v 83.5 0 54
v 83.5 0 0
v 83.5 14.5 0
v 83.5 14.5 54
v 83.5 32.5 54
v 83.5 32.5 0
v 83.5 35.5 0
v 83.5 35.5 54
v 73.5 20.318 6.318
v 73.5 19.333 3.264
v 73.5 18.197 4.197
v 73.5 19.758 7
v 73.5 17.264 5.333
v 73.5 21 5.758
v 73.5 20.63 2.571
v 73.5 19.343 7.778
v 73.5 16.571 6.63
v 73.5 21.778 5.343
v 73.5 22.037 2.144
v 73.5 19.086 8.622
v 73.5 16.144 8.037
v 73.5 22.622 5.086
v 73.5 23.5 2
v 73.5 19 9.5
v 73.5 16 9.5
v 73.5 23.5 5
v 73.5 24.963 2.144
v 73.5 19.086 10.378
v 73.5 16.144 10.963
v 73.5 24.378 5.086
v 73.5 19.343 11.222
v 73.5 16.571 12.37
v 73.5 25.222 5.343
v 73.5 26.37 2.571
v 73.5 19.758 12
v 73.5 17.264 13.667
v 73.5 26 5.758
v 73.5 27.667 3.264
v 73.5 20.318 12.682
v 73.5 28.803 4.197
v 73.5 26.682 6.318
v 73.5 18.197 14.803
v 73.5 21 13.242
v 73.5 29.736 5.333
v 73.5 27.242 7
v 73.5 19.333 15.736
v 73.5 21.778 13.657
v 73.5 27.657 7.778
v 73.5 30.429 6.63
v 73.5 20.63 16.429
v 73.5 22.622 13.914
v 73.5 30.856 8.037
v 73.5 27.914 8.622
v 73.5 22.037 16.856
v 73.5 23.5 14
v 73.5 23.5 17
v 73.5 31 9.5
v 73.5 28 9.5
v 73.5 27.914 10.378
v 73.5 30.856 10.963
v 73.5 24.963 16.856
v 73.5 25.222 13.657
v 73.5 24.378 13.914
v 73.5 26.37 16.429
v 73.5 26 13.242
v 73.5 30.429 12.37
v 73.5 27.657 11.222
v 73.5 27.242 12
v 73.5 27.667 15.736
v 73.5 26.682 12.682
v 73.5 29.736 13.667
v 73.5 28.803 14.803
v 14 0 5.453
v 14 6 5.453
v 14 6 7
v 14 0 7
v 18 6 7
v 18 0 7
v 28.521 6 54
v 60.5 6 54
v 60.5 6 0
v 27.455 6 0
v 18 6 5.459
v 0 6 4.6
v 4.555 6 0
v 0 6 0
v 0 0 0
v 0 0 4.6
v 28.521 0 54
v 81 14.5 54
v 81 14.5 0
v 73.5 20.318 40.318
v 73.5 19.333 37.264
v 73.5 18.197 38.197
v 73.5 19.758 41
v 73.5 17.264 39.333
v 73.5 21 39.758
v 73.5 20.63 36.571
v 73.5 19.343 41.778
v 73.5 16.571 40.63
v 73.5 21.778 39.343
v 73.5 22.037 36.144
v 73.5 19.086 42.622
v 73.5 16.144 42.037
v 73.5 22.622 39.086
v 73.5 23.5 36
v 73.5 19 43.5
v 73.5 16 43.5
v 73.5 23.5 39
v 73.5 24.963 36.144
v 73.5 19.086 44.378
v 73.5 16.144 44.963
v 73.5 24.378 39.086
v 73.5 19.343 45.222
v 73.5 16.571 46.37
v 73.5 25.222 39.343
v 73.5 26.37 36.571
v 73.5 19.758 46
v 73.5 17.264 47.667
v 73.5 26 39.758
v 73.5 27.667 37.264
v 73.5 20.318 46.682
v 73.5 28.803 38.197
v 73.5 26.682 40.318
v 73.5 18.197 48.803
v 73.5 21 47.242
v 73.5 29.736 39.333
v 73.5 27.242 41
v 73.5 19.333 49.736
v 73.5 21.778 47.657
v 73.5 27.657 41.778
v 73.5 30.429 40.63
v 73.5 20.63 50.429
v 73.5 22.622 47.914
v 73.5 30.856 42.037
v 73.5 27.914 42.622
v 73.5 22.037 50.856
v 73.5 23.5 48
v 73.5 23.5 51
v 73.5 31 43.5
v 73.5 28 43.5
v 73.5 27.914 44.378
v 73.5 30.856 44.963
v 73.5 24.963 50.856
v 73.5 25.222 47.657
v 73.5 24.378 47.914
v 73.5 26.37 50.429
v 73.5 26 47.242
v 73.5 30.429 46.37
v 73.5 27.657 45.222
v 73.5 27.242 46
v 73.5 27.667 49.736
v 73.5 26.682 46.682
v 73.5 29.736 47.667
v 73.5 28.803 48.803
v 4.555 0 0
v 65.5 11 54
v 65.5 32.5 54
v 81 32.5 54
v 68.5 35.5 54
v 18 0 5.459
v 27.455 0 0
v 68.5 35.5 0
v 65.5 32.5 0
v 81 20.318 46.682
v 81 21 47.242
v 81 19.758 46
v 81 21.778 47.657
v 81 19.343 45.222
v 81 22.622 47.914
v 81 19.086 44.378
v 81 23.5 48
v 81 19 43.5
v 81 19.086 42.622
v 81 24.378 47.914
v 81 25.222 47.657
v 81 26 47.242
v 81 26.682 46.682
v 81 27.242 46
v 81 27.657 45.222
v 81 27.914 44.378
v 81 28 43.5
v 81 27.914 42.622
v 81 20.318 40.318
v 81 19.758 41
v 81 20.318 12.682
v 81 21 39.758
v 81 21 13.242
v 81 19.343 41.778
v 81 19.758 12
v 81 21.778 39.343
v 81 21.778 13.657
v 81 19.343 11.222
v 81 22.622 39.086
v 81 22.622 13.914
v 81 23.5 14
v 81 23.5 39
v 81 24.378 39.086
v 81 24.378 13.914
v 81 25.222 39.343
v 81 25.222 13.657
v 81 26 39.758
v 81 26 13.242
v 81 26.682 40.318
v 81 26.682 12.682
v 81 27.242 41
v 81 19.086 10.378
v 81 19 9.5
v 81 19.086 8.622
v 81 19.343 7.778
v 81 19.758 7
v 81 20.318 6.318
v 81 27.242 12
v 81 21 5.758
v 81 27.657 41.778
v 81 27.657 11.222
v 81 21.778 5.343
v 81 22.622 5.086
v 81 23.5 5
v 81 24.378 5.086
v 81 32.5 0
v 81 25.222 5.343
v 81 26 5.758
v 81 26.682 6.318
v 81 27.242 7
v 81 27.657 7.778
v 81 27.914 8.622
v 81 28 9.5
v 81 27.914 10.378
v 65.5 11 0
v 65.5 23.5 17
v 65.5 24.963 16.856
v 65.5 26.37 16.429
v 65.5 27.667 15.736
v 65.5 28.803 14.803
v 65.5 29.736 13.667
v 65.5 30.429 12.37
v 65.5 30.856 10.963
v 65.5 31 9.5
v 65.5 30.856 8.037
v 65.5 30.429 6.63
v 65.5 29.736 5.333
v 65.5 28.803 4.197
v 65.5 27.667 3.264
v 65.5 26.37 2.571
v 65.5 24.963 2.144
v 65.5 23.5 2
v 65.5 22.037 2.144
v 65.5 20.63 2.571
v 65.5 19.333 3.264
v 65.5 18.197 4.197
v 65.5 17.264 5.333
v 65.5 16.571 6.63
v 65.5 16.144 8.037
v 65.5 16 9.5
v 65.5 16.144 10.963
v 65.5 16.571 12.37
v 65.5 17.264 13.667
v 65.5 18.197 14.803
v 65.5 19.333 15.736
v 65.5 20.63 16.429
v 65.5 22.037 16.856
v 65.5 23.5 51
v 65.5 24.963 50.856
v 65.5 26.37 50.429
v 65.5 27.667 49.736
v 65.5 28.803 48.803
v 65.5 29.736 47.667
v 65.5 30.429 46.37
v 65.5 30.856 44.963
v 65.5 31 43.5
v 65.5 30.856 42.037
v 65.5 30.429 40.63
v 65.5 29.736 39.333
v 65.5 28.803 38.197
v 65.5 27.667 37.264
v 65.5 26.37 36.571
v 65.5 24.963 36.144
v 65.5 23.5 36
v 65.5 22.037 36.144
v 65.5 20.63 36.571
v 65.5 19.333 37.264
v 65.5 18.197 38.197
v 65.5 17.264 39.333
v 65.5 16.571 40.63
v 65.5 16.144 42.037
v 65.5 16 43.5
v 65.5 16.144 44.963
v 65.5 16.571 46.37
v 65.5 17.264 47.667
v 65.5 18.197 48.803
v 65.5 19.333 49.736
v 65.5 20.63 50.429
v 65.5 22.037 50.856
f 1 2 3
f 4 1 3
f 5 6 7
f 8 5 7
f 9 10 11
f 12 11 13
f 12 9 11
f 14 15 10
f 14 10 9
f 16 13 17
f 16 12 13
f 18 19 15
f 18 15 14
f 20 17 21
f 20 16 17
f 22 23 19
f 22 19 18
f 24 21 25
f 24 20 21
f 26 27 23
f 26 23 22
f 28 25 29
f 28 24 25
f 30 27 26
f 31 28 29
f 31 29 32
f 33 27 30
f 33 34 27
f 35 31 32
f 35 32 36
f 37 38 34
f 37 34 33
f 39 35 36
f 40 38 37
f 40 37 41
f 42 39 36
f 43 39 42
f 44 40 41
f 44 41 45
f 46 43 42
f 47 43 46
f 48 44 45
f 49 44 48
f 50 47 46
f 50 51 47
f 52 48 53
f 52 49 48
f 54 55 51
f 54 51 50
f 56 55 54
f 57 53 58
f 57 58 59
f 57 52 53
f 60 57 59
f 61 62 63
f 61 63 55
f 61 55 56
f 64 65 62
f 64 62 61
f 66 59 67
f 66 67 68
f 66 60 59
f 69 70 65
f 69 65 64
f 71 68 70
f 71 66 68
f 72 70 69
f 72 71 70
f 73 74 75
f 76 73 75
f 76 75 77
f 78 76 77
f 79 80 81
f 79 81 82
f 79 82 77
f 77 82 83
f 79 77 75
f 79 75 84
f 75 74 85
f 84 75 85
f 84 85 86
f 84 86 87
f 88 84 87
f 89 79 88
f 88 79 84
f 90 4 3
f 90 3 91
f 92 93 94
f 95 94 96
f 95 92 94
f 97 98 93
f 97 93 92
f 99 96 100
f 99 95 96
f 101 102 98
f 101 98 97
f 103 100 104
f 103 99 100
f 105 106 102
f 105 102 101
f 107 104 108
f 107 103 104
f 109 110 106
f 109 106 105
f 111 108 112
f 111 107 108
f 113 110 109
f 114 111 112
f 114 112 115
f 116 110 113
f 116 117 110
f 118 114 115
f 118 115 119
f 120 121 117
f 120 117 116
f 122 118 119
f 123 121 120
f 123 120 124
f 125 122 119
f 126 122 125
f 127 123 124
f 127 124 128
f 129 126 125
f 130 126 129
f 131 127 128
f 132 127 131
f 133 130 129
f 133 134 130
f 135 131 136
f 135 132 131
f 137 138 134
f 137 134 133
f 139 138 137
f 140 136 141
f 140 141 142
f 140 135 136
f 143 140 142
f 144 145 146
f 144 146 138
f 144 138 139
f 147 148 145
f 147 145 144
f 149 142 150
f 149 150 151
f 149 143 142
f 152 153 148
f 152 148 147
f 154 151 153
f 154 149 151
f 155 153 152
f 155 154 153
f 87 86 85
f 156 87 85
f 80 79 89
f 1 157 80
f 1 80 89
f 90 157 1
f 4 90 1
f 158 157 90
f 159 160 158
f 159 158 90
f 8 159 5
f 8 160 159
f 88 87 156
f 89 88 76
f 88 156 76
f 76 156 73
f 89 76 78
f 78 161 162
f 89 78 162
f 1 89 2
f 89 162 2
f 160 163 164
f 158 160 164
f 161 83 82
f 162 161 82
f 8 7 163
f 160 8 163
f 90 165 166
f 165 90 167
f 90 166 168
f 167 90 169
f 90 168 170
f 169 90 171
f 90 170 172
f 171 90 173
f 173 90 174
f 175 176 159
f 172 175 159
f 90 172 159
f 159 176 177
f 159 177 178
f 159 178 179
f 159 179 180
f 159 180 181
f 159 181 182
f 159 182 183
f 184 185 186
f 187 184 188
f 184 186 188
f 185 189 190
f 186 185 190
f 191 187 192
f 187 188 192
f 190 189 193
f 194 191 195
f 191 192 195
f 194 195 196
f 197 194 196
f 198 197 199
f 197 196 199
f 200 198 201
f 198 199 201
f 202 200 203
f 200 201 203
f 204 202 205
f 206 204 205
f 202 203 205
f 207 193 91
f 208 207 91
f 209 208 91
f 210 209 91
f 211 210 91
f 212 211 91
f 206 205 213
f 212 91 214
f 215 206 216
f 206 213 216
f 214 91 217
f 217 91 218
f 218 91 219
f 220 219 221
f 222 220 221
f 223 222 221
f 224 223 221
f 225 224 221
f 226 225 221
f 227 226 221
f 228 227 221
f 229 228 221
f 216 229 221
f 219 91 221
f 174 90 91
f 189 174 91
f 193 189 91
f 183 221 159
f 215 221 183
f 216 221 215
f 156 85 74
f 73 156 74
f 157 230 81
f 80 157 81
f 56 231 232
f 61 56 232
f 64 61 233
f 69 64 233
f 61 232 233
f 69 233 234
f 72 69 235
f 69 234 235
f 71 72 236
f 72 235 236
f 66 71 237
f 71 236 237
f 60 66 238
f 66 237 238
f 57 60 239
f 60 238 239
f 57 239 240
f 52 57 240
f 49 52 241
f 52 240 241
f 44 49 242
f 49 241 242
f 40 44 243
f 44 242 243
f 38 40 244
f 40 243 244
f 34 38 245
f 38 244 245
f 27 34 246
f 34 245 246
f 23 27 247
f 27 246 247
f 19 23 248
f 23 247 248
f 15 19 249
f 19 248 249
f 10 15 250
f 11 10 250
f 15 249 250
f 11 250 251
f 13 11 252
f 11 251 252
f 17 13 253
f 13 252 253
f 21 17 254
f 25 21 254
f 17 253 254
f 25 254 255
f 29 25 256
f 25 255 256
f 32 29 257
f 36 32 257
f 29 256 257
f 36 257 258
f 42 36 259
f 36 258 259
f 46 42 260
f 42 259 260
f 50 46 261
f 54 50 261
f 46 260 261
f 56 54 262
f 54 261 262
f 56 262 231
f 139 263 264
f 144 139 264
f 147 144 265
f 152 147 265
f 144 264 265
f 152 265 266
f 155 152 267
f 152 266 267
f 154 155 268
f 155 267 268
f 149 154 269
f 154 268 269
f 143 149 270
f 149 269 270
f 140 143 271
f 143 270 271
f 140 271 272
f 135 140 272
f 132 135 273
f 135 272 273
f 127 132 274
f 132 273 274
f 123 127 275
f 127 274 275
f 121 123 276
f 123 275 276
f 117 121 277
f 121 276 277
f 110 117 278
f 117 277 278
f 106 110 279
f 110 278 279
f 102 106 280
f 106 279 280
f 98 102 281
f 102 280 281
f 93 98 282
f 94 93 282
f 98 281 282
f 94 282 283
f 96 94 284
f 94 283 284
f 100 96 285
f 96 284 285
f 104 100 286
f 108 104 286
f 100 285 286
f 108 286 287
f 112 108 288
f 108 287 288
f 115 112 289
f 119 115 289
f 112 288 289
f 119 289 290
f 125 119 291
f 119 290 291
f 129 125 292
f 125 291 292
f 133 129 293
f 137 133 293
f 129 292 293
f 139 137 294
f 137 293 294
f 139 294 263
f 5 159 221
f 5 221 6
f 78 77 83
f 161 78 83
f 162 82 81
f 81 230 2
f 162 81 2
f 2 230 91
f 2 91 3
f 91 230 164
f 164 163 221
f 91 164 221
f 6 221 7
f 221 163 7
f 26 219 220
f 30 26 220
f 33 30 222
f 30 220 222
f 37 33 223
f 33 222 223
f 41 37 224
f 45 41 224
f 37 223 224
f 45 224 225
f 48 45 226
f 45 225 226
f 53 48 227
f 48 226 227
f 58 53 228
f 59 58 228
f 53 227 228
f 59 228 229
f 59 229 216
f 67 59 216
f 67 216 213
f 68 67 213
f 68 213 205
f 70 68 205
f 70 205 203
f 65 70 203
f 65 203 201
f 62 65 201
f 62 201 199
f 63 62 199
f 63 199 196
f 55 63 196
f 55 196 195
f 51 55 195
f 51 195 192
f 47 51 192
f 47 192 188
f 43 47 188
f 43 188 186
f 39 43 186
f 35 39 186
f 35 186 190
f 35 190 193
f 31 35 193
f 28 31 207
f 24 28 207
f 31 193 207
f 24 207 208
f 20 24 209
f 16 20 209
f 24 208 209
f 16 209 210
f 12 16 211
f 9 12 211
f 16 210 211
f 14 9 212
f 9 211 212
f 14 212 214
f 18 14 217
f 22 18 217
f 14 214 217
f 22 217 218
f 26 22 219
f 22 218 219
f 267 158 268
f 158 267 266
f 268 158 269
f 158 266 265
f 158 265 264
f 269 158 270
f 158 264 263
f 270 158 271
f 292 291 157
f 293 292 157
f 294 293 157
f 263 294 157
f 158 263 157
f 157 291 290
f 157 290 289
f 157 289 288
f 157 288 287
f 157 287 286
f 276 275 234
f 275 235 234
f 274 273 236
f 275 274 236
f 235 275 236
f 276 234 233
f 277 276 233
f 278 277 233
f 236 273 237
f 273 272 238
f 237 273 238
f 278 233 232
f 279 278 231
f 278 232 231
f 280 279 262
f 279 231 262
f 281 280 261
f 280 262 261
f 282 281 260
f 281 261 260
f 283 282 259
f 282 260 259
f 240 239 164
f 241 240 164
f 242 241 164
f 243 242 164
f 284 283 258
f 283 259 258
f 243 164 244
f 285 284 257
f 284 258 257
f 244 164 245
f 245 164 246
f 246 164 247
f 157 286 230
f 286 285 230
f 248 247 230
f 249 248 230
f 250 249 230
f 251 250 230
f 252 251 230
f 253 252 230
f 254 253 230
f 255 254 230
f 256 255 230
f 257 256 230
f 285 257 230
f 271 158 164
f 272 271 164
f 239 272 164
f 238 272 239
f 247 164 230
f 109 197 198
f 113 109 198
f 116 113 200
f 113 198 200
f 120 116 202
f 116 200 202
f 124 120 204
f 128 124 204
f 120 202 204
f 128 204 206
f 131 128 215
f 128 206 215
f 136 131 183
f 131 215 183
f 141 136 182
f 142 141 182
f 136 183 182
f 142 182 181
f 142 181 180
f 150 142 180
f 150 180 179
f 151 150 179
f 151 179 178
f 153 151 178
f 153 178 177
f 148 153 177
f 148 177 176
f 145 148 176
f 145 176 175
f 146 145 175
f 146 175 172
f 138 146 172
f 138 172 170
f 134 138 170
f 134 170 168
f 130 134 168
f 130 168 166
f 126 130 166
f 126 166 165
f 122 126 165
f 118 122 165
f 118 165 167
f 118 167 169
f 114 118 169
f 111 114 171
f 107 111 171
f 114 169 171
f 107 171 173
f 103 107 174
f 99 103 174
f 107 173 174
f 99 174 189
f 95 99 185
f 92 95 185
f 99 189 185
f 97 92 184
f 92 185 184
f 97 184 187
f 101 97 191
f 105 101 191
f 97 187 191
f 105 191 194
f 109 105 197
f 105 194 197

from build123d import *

# Parameters (mm, degrees)
AUFSATZ_LINEAR_AUSTRAGEN1_DEPTH = 54
SCHNITT_LINEAR_AUSTRAGEN1_DEPTH = 7
SCHNITT_LINEAR_AUSTRAGEN2_DEPTH = 7
SCHNITT_LINEAR_AUSTRAGEN3_REACH = 83
SKIZZE4_R                       = 4.5
SKIZZE5_R                       = 7.5
SCHNITT_LINEAR_AUSTRAGEN4_DEPTH = 8


with BuildPart() as part:
    # Skizze1 → Aufsatz-Linear austragen1 (new body)
    with BuildSketch(Plane.XY):
        Polygon((0, 6), (0, 0), (83.5, 0), (83.5, 14.5), (81, 14.5), (81, 32.5), (83.5, 32.5), (83.5, 35.5), (68.5, 35.5), (65.5, 32.5), (65.5, 11), (60.5, 6), align=None)
    extrude(amount=AUFSATZ_LINEAR_AUSTRAGEN1_DEPTH)

    # Skizze2 → Schnitt-Linear austragen1 (cut, through all)
    with BuildSketch(Plane(origin=(0, 6, 0), x_dir=(1, 0, 0), z_dir=(0, 1, 0))):
        Polygon((28.521103298, -54), (0, -4.6), (0, -54), align=None)
    extrude(amount=-SCHNITT_LINEAR_AUSTRAGEN1_DEPTH, mode=Mode.SUBTRACT)

    # Skizze3 → Schnitt-Linear austragen2 (cut, through all)
    with BuildSketch(Plane(origin=(0, 6, 0), x_dir=(1, 0, 0), z_dir=(0, 1, 0))):
        Polygon((14, -5.452863896), (14, -7), (18, -7), (18, -5.459056191), (27.455362685, 0), (4.555362685, 0), align=None)
    extrude(amount=-SCHNITT_LINEAR_AUSTRAGEN2_DEPTH, mode=Mode.SUBTRACT)

    # Skizze4 → Schnitt-Linear austragen3 (cut, up to next)
    with BuildSketch(Plane(origin=(81, 0, 0), x_dir=(0, 0, -1), z_dir=(1, 0, 0)), mode=Mode.PRIVATE) as schnitt_linear_austragen3_sk1:
        with Locations((-9.5, 23.5)):
            Circle(SKIZZE4_R)
    schnitt_linear_austragen3_tool1 = extrude(schnitt_linear_austragen3_sk1.sketch, amount=-SCHNITT_LINEAR_AUSTRAGEN3_REACH, mode=Mode.PRIVATE) & part.part
    add(schnitt_linear_austragen3_tool1.solids().sort_by_distance((81, 23.5, 9.5))[0], mode=Mode.SUBTRACT)
    # Skizze4 → Schnitt-Linear austragen3 (cut, up to next)
    with BuildSketch(Plane(origin=(81, 0, 0), x_dir=(0, 0, -1), z_dir=(1, 0, 0)), mode=Mode.PRIVATE) as schnitt_linear_austragen3_sk2:
        with Locations((-43.5, 23.5)):
            Circle(SKIZZE4_R)
    schnitt_linear_austragen3_tool2 = extrude(schnitt_linear_austragen3_sk2.sketch, amount=-SCHNITT_LINEAR_AUSTRAGEN3_REACH, mode=Mode.PRIVATE) & part.part
    add(schnitt_linear_austragen3_tool2.solids().sort_by_distance((81, 23.5, 43.5))[0], mode=Mode.SUBTRACT)

    # Skizze5 → Schnitt-Linear austragen4 (cut)
    with BuildSketch(Plane.ZY.offset(-65.5)):
        with Locations((43.5, 23.5)):
            Circle(SKIZZE5_R)
        with Locations((9.5, 23.5)):
            Circle(SKIZZE5_R)
    extrude(amount=-SCHNITT_LINEAR_AUSTRAGEN4_DEPTH, mode=Mode.SUBTRACT)


solid = part.part
